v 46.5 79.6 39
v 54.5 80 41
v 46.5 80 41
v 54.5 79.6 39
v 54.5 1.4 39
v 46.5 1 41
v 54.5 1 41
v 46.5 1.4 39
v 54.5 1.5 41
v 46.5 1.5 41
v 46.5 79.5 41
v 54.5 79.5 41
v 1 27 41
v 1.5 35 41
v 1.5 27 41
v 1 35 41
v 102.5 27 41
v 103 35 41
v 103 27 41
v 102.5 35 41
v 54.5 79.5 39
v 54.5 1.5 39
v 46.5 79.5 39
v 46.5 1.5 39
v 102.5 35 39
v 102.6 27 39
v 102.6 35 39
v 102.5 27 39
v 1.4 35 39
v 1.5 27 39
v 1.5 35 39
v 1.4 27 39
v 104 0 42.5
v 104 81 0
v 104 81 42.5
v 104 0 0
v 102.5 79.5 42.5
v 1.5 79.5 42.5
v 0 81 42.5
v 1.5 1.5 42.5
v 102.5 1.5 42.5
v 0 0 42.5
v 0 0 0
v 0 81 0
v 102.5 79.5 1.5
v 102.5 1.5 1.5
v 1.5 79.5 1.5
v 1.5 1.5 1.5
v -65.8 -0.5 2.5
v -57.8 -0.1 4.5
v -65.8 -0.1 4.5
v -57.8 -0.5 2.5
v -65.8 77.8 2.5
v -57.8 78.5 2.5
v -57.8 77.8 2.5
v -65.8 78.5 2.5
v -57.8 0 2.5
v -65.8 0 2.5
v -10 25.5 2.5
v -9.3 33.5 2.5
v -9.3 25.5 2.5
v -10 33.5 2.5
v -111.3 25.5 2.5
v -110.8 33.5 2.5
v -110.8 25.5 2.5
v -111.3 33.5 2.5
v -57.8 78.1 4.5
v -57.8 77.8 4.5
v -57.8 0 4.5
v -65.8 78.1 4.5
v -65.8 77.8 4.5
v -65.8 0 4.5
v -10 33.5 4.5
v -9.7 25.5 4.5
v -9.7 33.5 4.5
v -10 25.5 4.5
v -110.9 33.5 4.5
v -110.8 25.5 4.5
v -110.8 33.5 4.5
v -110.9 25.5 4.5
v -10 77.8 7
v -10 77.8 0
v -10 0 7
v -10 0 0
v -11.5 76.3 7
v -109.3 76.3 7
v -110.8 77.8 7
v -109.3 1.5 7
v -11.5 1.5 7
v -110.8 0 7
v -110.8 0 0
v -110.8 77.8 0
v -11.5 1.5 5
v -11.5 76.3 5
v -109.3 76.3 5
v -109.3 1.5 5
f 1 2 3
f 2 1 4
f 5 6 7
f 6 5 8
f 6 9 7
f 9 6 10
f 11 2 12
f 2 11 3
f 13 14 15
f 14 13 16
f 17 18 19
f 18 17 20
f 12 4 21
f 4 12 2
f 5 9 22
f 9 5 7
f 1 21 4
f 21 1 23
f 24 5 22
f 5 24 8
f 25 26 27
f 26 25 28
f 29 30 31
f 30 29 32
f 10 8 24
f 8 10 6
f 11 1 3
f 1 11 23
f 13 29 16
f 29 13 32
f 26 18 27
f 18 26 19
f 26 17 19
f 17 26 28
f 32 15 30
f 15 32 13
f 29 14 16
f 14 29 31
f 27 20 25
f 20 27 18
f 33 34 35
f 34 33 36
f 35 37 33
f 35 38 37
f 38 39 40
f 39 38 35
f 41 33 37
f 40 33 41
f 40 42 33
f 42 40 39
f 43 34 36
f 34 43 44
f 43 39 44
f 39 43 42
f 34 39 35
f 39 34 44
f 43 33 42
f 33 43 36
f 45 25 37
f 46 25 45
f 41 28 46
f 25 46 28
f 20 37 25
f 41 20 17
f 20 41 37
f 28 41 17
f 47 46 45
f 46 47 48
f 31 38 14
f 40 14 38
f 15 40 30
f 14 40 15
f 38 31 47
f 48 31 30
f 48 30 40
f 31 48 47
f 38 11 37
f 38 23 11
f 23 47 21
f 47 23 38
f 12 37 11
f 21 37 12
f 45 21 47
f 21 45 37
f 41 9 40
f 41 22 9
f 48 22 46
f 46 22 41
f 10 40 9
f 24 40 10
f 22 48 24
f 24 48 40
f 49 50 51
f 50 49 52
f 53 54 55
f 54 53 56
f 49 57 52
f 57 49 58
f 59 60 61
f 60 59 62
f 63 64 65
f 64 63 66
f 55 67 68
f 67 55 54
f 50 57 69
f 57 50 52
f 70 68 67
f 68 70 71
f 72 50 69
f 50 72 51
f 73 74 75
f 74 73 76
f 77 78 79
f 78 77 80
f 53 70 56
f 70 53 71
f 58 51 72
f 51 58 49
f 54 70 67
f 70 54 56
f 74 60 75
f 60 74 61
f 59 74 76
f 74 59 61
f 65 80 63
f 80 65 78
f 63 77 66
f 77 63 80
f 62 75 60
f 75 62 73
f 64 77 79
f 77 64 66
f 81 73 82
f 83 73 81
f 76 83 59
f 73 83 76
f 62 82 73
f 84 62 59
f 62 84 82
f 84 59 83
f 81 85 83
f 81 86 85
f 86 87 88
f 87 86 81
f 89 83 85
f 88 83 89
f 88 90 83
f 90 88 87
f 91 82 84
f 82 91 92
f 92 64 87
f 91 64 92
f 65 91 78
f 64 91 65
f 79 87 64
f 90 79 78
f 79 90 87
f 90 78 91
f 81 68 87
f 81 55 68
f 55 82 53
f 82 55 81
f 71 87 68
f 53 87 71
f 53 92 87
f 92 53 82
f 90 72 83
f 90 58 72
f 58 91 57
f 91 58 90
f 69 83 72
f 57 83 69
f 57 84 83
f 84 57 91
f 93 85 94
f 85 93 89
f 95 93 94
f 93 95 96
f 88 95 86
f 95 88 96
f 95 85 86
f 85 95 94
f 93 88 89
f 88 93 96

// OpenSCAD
// Butterdosen-Parameter und beide Module in einer Datei
// Steuerung: Was soll angezeigt werden?
zeige_deckel = true;
zeige_boden = true;

// Gemeinsame Variablen
butter_laenge = 95;
butter_breite = 72;
butter_hoehe = 38;
spielraum = 3;
wandstaerke = 1.5;

// Deckelmaße
deckel_innenlaenge = butter_laenge + 2 * spielraum;
deckel_aussenlaenge = deckel_innenlaenge + 2 * wandstaerke;
deckel_innenbreite = butter_breite + 2 * spielraum;
deckel_aussenbreite = deckel_innenbreite + 2 * wandstaerke;
deckel_hoehe = butter_hoehe + spielraum + wandstaerke; // eigentliche Deckelhöhe

// Bodenmaße (direkt aus Deckelmaßen berechnet)
boden_spiel = 0.1; // zusätzliches Spiel, damit Deckel gut passt
boden_aussenlaenge = deckel_innenlaenge - 2 * boden_spiel;
boden_aussenbreite = deckel_innenbreite - 2 * boden_spiel;
boden_hoehe = 7; // 7mm effektive Höhe
boden_bodenstaerke = 5; // 0,5cm Bodenstärke

// Rast-Parameter
rast_hoehe = 2; // Höhe der Rastnase
rast_breite = 8; // Breite der Rastnase
rast_tiefe = 0.5; // Wie weit die Nase herausragt

// Deckel-Modul
// Die geschlossene Seite (Deckeloberseite) liegt im Koordinatensystem unten (z=0)
// Die Öffnung zeigt nach oben (z=cover_height_extra)
// Der Schnitt zum Abtrennen der Überhöhe erfolgt nach dem Druck bei z=cover_height
module deckel() {
  difference() {
    // Außen: Quader mit geschlossener Unterseite bei z=0
    cube([deckel_aussenlaenge, deckel_aussenbreite, deckel_hoehe], center=false);
    // Innen: Von oben nach unten ausgeschnitten, sodass unten geschlossen bleibt
    // Die innere Aussparung beginnt bei z=wandstaerke und reicht bis ganz nach oben
    translate([wandstaerke, wandstaerke, wandstaerke])
      cube([deckel_aussenlaenge - 2 * wandstaerke, deckel_aussenbreite - 2 * wandstaerke, deckel_hoehe], center=false);
    // Die Schnittkante für die finale Deckelhöhe ist bei z=cover_height
    // (Das kann nach dem Druck einfach abgeschnitten werden)

    rastQuader(deckel_hoehe-2,true);
  }
}

module rastQuader(hoehe,mirrorVersatz =false) {
  // Rasteinsparungen: 4 Aussparungen an den Seiten, innen, auf Höhe rast_deckel_z
  // Rasteinparungen in y-richtung
  translate([(deckel_innenlaenge - rast_breite) / 2, wandstaerke - rast_tiefe, hoehe +rast_hoehe - wandstaerke])
    TrapezPrisma(deckel_innenbreite + 2 * rast_tiefe, rast_hoehe, rast_breite, 0.4, "yz",mirrorVersatz);
  //cube([rast_breite, deckel_innenbreite + 2 * rast_tiefe, rast_hoehe], center=false);
  // Rasteinparungen in x-richtung
  translate([wandstaerke - rast_tiefe, (deckel_innenbreite - rast_breite) / 2, hoehe  +rast_hoehe - wandstaerke])
    TrapezPrisma(deckel_innenlaenge + 2 * rast_tiefe, rast_hoehe, rast_breite, 0.4, "xz",mirrorVersatz);

  //cube([deckel_innenlaenge + 2 * rast_tiefe, rast_breite, rast_hoehe], center=false);
}

module Ausrichten(basisFlaeche = "xy") {
  if (basisFlaeche == "yz") {
    rotate([90, 0, 90]) {
      children();
    }
  } else if (basisFlaeche == "xz") {
    rotate([90, 0, 0]) {
      children();
    }
  } else if (basisFlaeche == "xy") {
    children();
  }
}
module TrapezPrisma(breite, hoehe, volumenTiefe, xVersatz, basisFlaeche = "xy", mirrorVersatz = false) {

   mirrorZ = mirrorVersatz ? 1 : 0;
    mirror(v = [0,0,mirrorZ]) 
  Ausrichten(basisFlaeche) {
    linear_extrude(height=volumenTiefe) {
      polygon(
        [
          [0, 0], // unten links
          [breite, 0], // unten rechts
          [breite - xVersatz, hoehe], // oben rechts
          [xVersatz, hoehe], // oben links
        ]
      );
    }
  }
}

// Boden-Modul
module boden() {

  difference() {
    union() {
      // Außen: Hohlquader
      cube([boden_aussenlaenge, boden_aussenbreite, boden_hoehe], center=false);

      translate([-wandstaerke, -wandstaerke, 0]) {
        rastQuader(2);
      }
    }

    // Innen: Seitenwände 1,5mm, Boden 0,5cm dick
    translate([wandstaerke, wandstaerke, boden_bodenstaerke])
      cube([boden_aussenlaenge - 2 * wandstaerke, boden_aussenbreite - 2 * wandstaerke, boden_hoehe], center=false);
  }
}

if (zeige_deckel) deckel();
if (zeige_boden) {
  if (zeige_deckel) {
    // Boden unter den Deckel verschieben, damit sie nicht kollidieren
    translate([-boden_aussenlaenge - 10, 0, 0])
      boden();
  } else {
    boden();
  }
}
